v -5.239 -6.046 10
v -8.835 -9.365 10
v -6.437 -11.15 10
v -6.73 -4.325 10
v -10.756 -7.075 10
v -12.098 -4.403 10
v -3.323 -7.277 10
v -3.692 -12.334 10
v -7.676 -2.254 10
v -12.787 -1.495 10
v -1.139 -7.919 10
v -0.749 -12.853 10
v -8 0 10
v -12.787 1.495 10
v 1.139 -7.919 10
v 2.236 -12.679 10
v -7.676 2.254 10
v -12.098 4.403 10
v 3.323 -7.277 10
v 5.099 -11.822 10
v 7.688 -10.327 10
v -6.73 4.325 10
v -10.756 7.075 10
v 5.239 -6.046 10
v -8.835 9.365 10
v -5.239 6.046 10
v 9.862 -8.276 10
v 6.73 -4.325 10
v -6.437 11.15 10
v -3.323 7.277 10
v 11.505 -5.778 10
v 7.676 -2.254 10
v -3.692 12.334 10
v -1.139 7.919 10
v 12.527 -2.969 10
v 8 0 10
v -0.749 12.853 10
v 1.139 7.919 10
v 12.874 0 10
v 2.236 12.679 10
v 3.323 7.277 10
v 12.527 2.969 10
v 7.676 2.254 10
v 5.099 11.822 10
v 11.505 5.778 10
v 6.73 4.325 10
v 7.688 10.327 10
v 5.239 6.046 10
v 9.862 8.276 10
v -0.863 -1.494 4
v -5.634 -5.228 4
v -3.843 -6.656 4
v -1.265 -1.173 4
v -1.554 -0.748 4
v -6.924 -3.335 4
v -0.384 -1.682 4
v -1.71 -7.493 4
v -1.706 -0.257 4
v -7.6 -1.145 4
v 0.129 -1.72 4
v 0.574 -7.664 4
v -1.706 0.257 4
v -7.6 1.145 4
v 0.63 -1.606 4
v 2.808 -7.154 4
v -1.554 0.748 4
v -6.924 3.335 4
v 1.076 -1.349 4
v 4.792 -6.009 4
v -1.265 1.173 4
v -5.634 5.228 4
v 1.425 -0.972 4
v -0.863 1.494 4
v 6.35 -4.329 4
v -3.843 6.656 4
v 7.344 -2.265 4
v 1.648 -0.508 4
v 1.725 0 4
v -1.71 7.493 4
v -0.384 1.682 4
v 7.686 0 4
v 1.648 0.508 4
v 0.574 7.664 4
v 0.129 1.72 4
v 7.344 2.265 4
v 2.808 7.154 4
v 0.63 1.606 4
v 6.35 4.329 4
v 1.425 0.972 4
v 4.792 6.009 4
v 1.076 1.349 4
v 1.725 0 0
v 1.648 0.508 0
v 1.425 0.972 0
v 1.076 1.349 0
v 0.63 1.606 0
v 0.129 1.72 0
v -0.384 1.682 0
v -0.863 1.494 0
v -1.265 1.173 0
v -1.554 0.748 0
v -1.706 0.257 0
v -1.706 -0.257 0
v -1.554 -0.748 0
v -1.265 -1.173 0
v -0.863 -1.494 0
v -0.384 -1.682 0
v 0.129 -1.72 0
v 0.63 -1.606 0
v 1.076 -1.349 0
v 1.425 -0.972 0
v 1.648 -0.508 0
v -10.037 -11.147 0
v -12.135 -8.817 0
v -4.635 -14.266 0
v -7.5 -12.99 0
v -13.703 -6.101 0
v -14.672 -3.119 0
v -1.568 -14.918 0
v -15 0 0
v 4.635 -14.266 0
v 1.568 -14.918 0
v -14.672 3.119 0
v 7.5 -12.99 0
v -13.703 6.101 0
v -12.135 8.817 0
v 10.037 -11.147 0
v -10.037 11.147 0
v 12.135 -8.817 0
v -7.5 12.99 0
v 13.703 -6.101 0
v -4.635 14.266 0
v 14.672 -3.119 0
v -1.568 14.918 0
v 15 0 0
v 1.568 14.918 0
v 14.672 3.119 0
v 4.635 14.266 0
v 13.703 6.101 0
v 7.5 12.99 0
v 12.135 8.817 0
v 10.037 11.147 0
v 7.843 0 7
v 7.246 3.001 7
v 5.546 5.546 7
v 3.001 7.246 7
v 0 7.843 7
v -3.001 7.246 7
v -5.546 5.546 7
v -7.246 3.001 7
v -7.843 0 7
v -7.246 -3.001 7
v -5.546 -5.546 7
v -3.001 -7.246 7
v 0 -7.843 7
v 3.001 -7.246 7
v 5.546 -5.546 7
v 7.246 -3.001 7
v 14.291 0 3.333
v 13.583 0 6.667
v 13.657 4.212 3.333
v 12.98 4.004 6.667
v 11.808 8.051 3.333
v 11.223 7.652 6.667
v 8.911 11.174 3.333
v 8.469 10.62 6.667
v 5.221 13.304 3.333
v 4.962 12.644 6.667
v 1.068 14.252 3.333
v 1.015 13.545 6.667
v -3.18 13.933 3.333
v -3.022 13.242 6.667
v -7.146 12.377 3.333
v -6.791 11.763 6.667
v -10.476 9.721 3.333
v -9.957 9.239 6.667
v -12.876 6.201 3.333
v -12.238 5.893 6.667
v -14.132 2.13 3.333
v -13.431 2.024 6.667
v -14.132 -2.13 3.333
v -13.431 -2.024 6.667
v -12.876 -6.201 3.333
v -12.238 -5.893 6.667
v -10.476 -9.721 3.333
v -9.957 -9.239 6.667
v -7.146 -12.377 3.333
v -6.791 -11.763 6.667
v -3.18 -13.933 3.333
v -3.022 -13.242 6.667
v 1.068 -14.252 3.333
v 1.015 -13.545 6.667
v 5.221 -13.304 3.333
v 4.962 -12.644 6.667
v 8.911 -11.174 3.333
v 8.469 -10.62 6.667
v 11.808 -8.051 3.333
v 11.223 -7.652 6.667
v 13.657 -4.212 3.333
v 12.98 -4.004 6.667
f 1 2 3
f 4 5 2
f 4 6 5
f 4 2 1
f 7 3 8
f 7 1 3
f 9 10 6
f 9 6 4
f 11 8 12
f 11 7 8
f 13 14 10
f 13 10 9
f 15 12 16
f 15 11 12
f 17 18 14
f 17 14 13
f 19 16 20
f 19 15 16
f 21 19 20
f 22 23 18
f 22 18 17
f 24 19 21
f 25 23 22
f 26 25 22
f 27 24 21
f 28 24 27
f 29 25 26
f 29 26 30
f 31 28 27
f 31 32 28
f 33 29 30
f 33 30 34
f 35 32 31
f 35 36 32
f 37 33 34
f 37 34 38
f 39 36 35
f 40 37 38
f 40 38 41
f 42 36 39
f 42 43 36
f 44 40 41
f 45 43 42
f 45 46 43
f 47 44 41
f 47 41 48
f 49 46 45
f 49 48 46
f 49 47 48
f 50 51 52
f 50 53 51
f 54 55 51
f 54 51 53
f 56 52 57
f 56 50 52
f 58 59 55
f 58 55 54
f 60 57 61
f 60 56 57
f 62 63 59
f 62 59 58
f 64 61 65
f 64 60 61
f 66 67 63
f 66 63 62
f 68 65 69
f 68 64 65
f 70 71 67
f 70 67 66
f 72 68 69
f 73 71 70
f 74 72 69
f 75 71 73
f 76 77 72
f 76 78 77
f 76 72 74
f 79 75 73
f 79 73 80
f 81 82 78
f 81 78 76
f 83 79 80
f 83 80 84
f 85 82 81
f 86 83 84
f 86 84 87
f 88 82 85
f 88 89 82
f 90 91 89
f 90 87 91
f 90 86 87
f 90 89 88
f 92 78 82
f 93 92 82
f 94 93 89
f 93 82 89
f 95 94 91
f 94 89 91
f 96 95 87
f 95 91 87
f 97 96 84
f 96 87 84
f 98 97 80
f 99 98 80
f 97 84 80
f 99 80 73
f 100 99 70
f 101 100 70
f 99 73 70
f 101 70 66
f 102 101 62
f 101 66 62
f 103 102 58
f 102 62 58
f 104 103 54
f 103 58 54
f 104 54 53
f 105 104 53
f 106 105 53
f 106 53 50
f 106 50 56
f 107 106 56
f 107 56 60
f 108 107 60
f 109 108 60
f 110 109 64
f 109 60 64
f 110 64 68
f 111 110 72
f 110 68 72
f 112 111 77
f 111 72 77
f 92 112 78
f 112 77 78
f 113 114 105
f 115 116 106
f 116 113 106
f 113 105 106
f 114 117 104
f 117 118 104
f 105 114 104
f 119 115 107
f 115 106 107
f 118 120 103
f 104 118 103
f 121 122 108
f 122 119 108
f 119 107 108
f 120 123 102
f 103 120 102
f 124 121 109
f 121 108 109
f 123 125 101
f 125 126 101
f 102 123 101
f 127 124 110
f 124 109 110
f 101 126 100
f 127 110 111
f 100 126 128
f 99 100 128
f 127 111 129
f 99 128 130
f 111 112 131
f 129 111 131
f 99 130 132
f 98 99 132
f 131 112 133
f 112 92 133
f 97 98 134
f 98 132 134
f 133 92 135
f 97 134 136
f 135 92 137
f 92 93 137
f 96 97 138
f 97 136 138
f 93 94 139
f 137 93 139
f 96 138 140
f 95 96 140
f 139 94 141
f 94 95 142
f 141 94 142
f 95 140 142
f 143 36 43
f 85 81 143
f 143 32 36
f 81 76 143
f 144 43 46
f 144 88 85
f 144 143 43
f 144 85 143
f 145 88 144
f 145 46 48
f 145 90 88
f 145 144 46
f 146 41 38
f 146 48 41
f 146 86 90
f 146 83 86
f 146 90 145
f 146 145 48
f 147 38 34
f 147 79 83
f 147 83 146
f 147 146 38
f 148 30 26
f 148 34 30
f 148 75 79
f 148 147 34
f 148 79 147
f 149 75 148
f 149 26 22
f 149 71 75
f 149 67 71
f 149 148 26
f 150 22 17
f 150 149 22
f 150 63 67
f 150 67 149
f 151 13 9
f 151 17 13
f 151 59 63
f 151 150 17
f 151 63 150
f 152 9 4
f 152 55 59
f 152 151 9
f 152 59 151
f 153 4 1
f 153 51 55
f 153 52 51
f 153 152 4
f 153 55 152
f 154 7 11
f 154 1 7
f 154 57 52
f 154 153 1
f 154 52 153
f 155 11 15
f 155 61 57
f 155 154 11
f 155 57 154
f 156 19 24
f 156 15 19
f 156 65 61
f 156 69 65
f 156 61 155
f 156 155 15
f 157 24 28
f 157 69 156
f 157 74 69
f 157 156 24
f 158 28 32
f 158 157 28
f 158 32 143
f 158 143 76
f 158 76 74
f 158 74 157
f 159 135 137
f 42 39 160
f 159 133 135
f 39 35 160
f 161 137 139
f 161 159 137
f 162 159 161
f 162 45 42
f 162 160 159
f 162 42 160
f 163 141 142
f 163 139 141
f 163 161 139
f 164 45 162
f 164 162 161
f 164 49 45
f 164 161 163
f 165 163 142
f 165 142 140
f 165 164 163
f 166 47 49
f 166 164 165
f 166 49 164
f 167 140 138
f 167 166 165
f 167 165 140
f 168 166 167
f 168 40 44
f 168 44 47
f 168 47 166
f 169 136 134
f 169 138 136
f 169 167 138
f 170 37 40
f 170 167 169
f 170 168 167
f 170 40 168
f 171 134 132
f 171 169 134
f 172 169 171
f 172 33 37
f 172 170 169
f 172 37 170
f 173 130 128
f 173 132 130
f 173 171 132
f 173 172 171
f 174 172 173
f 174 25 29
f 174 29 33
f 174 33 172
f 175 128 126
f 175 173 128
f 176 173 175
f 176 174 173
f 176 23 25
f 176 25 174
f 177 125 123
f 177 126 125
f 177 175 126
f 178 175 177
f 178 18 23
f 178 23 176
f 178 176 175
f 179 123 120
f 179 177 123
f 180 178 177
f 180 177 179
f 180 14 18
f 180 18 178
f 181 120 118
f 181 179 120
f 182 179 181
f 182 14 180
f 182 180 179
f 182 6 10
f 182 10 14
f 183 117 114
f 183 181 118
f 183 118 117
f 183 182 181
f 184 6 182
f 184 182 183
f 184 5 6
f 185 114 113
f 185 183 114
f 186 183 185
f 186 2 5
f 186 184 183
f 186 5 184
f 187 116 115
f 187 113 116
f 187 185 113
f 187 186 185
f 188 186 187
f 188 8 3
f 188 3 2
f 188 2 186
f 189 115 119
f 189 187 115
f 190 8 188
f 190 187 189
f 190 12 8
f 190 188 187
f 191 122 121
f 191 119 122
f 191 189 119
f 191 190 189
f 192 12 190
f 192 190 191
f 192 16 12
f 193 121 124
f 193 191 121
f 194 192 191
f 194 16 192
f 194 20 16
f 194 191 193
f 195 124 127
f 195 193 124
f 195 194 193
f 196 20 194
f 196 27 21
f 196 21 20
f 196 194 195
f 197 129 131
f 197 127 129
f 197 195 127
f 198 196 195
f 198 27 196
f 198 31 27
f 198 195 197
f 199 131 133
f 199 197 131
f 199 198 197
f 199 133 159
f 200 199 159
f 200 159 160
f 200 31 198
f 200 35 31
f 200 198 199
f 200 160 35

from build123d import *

# Parameters (mm, degrees)
F0_R     = 15
F1_DEPTH = 10
F1_TAPER = 12
F2_R     = 8
F3_DEPTH = 6
F3_TAPER = 3
F4_R     = 1.725
F5_DEPTH = 4


with BuildPart() as f1:
    # F0 (on Top) → F1 (new body)
    with BuildSketch(Plane.XY):
        Circle(F0_R)
    extrude(amount=F1_DEPTH, taper=F1_TAPER)

    # F2 (on face) → F3 (cut)
    with BuildSketch(Plane.XY.offset(10)):
        Circle(F2_R)
    extrude(amount=-F3_DEPTH, taper=F3_TAPER, mode=Mode.SUBTRACT)

    # F4 (on face) → F5 (cut, through all)
    with BuildSketch(Plane.XY.offset(4)):
        Circle(F4_R)
    extrude(amount=-F5_DEPTH, mode=Mode.SUBTRACT)


solid = f1.part
